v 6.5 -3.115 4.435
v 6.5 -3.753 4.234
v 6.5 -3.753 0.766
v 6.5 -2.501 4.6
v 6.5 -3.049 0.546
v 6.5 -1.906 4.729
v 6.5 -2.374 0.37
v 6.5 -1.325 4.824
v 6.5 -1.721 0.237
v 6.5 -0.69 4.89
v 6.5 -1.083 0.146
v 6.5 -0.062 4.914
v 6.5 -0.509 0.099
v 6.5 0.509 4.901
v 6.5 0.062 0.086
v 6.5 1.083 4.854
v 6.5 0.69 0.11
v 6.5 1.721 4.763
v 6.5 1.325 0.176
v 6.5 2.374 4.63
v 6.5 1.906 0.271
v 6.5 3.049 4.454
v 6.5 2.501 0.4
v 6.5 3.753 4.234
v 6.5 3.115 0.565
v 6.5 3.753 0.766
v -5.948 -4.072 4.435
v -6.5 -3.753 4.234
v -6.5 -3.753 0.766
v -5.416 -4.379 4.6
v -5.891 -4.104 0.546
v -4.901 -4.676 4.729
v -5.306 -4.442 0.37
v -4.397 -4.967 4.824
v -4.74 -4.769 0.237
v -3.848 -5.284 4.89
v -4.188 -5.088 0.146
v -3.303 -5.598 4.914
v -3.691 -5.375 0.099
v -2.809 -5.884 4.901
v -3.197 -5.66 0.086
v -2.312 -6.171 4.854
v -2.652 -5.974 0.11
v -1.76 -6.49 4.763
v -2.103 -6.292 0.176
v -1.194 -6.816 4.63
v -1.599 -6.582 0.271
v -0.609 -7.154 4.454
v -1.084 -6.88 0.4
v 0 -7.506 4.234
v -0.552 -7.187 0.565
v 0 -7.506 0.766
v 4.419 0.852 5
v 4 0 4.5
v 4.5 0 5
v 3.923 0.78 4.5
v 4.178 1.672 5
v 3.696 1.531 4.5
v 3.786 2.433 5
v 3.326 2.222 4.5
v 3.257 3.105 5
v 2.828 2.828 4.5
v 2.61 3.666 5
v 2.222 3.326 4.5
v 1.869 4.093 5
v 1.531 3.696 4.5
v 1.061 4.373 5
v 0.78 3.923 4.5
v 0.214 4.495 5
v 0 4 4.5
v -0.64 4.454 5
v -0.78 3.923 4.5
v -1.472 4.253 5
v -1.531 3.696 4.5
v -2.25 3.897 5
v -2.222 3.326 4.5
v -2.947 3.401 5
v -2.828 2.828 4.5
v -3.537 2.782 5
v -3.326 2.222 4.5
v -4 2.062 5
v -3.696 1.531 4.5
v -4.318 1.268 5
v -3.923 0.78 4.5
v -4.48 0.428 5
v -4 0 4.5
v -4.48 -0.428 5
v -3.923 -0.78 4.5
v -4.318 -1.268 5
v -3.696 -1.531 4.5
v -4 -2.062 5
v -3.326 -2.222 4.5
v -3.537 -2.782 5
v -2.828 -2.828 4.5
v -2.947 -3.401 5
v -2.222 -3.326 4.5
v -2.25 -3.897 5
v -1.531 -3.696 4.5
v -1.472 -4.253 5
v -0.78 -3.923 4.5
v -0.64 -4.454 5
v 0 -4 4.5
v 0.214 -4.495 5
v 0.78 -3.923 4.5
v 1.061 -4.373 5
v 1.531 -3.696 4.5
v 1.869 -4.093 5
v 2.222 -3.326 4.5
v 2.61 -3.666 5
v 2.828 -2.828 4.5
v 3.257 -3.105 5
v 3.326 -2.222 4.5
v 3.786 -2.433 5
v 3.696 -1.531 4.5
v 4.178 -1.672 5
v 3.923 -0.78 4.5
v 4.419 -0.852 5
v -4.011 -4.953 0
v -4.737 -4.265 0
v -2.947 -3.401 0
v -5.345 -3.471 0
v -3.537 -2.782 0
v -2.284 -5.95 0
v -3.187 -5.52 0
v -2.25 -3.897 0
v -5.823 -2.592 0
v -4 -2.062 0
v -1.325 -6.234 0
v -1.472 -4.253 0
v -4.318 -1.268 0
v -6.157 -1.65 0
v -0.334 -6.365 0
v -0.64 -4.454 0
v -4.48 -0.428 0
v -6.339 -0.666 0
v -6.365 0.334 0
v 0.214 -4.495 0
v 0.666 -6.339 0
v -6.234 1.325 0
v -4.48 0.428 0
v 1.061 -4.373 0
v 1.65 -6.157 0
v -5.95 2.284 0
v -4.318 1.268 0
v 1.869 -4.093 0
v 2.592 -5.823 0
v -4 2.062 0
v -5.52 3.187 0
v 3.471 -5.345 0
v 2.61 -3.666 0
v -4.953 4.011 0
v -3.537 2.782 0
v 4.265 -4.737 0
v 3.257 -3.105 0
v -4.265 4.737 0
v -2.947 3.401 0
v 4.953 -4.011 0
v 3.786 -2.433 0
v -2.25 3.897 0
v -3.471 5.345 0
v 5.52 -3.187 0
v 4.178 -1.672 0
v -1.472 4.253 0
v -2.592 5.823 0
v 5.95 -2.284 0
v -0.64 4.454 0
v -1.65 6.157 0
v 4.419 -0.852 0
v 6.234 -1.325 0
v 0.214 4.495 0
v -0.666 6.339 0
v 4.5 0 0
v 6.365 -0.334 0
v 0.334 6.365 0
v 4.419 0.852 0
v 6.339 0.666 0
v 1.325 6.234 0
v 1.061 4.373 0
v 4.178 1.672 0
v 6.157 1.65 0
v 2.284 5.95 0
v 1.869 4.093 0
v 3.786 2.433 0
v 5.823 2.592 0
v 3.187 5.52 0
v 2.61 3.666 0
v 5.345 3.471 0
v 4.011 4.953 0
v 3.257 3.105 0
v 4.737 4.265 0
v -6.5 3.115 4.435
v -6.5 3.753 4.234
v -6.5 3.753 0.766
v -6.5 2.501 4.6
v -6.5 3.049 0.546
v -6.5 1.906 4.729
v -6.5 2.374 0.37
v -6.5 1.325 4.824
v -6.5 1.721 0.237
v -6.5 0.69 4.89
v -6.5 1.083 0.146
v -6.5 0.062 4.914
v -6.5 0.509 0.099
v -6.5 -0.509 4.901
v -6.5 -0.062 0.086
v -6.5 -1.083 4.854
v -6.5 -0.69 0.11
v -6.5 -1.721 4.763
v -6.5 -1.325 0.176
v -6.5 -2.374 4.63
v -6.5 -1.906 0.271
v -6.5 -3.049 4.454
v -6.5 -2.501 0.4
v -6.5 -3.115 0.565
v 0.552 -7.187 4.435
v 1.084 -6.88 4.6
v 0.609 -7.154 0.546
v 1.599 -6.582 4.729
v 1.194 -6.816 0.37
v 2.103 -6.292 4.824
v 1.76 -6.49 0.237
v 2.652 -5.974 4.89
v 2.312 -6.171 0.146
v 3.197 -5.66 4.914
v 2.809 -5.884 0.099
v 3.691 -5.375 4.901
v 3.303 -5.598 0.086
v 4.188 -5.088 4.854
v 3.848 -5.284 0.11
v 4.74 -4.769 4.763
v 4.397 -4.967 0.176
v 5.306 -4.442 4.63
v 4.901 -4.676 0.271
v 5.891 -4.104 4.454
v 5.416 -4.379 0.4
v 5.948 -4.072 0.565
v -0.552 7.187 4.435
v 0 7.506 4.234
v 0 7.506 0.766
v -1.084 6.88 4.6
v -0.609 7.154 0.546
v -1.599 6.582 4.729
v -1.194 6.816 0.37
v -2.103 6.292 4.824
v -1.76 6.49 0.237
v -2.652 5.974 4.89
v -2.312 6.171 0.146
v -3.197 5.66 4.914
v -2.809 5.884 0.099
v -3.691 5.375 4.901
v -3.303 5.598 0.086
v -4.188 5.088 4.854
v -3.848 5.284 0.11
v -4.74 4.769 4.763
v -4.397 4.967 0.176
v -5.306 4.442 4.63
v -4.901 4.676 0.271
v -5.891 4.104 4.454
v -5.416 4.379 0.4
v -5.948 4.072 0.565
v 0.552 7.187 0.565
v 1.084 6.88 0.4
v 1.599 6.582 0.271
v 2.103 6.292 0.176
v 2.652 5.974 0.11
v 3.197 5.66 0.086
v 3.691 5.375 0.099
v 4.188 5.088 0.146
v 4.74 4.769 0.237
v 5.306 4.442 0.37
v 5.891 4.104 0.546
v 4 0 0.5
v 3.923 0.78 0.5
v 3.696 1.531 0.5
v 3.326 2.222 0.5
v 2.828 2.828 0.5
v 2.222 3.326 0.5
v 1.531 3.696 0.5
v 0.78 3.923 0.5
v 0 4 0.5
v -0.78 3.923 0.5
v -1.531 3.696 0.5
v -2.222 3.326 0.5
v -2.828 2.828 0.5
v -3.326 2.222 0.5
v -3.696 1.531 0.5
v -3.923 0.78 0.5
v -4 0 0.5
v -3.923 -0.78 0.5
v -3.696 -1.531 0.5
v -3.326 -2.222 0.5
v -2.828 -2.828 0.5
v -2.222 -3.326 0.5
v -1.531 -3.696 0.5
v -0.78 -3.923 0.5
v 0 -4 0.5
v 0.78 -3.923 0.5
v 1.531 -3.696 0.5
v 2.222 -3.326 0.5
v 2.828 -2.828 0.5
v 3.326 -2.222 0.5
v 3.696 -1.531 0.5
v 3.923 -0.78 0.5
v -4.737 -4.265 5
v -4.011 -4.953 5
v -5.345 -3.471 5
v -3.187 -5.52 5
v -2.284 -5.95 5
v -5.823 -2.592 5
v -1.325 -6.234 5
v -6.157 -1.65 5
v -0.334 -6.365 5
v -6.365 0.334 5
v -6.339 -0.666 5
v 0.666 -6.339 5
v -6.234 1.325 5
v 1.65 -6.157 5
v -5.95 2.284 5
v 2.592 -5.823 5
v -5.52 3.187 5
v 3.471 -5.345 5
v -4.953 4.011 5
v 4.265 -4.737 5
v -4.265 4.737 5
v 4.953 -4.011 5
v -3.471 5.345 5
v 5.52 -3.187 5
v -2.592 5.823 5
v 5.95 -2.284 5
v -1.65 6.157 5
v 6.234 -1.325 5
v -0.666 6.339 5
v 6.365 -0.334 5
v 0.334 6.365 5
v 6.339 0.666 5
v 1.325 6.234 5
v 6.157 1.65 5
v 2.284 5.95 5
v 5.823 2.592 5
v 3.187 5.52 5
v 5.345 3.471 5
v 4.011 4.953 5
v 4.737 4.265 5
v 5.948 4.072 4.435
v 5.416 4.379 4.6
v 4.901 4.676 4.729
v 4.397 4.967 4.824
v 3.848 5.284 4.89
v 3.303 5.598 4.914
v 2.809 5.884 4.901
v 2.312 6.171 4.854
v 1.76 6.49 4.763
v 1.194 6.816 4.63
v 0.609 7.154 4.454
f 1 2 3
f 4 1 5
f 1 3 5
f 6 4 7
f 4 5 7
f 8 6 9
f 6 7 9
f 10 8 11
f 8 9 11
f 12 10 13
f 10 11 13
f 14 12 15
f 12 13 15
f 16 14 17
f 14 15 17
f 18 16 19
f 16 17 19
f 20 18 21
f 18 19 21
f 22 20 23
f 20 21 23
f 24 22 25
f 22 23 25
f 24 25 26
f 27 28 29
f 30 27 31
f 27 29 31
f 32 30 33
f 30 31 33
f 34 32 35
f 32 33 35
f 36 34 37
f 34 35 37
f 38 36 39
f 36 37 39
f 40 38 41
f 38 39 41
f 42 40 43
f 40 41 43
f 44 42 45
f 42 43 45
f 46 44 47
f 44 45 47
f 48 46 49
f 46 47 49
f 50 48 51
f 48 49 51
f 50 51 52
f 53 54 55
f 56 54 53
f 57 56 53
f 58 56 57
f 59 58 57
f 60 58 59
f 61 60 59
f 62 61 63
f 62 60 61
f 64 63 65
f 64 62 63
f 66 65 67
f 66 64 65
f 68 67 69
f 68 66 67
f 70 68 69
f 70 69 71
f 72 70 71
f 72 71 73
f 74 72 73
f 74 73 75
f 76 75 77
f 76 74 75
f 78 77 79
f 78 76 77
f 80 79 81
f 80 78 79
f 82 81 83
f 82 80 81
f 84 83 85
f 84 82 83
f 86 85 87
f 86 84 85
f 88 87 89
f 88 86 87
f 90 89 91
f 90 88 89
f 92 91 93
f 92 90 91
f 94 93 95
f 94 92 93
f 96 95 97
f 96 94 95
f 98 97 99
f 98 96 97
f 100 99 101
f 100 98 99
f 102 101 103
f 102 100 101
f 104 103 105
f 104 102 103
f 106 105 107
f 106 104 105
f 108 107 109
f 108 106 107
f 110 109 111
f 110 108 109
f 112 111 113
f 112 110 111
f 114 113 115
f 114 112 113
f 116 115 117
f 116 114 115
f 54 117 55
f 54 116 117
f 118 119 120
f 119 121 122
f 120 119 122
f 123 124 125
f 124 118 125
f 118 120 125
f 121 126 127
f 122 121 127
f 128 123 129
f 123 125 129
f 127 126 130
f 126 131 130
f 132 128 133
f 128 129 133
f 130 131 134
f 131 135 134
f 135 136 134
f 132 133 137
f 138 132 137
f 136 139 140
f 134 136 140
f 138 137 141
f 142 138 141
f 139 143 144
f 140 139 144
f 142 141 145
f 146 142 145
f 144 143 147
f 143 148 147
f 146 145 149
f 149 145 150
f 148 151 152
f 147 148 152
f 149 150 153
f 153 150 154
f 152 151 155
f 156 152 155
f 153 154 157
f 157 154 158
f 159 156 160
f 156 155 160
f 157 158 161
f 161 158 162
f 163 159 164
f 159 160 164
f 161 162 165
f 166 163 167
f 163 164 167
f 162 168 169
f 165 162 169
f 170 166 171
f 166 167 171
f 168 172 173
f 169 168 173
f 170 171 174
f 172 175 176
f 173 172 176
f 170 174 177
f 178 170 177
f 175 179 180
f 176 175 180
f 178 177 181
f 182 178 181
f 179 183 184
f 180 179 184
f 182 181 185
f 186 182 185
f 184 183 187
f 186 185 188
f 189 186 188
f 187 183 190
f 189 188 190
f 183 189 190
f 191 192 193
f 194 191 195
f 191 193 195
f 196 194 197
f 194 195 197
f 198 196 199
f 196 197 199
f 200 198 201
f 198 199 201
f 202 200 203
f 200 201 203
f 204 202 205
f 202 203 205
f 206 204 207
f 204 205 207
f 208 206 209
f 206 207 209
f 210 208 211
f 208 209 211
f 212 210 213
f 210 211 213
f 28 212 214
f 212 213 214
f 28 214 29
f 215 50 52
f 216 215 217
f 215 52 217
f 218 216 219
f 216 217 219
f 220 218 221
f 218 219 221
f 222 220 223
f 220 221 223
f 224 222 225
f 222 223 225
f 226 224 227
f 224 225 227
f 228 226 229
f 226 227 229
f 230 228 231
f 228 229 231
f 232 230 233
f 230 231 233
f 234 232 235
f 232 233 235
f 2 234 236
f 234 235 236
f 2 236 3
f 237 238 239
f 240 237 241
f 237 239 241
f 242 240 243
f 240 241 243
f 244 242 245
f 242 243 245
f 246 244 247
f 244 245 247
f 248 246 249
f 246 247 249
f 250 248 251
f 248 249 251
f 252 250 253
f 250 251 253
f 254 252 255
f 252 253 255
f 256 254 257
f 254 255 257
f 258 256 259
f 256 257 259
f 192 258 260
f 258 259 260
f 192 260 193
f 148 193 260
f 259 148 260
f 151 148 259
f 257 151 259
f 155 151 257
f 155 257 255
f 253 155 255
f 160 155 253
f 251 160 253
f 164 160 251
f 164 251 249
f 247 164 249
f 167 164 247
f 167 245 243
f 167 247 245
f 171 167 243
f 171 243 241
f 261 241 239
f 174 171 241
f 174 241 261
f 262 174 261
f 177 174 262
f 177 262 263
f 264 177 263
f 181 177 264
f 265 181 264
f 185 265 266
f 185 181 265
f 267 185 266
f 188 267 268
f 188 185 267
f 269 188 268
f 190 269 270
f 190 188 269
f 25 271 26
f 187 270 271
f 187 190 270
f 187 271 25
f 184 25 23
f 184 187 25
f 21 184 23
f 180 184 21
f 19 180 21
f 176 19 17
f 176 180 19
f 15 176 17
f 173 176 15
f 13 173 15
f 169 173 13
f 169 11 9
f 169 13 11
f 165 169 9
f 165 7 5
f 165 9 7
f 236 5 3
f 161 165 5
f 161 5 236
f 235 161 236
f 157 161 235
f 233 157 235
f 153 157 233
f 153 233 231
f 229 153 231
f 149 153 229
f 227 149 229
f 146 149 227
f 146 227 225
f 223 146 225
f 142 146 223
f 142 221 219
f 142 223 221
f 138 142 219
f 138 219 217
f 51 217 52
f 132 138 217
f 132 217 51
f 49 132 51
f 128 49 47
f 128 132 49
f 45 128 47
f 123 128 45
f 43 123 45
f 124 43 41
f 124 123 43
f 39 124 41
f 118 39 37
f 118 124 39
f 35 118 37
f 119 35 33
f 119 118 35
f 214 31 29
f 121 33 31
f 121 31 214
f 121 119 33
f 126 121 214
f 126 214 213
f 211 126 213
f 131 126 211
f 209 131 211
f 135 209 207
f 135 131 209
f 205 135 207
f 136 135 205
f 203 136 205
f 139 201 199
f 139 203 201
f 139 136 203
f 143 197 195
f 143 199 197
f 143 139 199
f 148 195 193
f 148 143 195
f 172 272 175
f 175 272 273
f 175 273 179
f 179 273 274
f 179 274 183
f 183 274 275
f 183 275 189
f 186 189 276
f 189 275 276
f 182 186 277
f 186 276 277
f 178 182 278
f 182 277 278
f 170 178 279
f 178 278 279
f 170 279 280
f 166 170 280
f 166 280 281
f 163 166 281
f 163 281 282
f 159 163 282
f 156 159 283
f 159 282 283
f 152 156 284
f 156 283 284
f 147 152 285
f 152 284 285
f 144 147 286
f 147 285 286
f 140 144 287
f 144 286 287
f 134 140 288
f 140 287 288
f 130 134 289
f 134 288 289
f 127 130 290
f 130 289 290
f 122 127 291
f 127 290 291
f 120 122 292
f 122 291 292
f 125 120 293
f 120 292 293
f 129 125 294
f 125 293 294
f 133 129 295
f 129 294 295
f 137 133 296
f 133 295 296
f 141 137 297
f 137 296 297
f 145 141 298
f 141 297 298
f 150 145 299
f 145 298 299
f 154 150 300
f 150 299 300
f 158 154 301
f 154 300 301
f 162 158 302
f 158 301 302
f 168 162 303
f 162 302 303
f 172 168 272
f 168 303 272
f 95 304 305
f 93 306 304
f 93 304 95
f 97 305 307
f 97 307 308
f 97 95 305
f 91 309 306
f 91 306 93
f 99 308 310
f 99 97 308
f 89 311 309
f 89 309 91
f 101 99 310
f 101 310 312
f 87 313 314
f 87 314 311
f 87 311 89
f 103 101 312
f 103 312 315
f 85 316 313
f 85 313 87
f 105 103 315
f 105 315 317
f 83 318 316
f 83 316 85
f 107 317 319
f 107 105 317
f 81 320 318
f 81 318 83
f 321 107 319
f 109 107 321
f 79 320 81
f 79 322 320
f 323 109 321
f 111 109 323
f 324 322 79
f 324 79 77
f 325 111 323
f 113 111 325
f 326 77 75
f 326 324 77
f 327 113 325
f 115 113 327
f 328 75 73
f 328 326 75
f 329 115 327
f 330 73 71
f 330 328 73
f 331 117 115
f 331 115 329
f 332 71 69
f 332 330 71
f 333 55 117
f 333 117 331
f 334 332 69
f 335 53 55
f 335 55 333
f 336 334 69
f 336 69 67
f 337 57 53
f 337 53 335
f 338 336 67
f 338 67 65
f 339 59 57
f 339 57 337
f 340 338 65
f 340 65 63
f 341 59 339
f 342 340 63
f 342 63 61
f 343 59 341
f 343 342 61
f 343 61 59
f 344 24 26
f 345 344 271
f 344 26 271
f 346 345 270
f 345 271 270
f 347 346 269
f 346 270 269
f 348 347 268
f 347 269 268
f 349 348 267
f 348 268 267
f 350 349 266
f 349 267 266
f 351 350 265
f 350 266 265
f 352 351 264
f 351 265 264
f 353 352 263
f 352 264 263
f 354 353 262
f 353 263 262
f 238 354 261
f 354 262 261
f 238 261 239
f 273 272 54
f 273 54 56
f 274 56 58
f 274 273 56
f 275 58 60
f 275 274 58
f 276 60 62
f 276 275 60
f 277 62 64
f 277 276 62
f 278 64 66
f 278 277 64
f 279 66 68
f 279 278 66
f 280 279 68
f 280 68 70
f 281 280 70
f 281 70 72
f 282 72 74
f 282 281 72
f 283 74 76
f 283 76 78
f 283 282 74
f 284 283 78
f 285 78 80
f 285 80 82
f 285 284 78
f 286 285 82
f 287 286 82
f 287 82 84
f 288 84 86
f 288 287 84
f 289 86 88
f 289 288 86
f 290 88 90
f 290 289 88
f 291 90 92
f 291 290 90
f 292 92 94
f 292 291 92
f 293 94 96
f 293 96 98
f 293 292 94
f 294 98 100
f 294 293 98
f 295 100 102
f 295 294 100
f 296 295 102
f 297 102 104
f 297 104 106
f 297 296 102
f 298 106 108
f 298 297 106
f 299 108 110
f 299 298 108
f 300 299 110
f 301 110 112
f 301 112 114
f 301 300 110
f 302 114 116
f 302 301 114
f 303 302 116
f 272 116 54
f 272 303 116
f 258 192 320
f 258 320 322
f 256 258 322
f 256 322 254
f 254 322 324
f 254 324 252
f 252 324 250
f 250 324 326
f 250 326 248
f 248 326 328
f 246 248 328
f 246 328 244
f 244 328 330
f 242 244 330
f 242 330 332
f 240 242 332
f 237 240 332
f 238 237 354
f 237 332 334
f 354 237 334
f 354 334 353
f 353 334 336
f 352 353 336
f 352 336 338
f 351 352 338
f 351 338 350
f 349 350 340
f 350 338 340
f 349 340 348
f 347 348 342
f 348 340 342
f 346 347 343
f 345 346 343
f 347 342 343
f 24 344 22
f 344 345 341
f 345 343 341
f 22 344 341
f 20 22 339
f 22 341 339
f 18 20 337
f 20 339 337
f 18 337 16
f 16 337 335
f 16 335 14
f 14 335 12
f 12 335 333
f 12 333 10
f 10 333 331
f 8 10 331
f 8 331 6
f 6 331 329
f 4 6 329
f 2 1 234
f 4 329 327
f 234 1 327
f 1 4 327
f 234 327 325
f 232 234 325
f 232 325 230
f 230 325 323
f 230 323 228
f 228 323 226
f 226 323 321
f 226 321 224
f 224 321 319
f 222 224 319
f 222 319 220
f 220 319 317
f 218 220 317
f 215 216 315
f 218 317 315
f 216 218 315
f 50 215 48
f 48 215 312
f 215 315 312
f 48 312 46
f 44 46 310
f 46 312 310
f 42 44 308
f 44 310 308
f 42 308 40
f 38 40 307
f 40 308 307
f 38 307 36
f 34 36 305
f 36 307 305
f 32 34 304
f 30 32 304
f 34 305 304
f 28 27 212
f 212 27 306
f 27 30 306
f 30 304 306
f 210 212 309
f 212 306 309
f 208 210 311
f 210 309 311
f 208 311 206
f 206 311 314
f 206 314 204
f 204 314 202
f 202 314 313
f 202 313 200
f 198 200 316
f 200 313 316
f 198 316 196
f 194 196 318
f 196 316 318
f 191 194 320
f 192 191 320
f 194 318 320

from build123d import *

# Parameters (mm, degrees)
SKETCH_1_R      = 4
EXTRUDE_1_DEPTH = 5
CHAMFER_1_SIZE  = 0.5


with BuildPart() as part:
    # 草图1 → 凸台-拉伸1 (new body)
    with BuildSketch(Plane.XY):
        Polygon((0, 7.505553499), (-6.5, 3.75277675), (-6.5, -3.75277675), (0, -7.505553499), (6.5, -3.75277675), (6.5, 3.75277675), align=None)
        Circle(SKETCH_1_R, mode=Mode.SUBTRACT)
    extrude(amount=EXTRUDE_1_DEPTH)

    # 草图2 → 切除-旋转1 (revolve, cut)
    with BuildSketch(Plane(origin=(0, 0, 0), x_dir=(0, 0, -1), z_dir=(1, 0, 0)), mode=Mode.PRIVATE) as cut_revolve_1_sk:
        Polygon((-4.142378968, 7.640341523), (-5.294673063, 5.938491783), (-5.294673063, 7.640341523), align=None)
    cut_revolve_1 = revolve(cut_revolve_1_sk.sketch.rotate(Axis((0, 0, 5), (0, 0, -1)), 300.000000026), axis=Axis((0, 0, 5), (0, 0, -1)), mode=Mode.SUBTRACT)

    # 镜向2: 切除-旋转1 across plane
    add(cut_revolve_1.mirror(Plane(origin=(0, 0, 2.5), x_dir=(1, 0, 0), z_dir=(0, 0, -1))), mode=Mode.SUBTRACT)

    # 倒角1
    chamfer_1_edges = [part.edges().sort_by_distance(p)[0] for p in [
        (-4, 0, 0),
        (-4, 0, 5),
    ]]
    chamfer(chamfer_1_edges, length=CHAMFER_1_SIZE)


solid = part.part
